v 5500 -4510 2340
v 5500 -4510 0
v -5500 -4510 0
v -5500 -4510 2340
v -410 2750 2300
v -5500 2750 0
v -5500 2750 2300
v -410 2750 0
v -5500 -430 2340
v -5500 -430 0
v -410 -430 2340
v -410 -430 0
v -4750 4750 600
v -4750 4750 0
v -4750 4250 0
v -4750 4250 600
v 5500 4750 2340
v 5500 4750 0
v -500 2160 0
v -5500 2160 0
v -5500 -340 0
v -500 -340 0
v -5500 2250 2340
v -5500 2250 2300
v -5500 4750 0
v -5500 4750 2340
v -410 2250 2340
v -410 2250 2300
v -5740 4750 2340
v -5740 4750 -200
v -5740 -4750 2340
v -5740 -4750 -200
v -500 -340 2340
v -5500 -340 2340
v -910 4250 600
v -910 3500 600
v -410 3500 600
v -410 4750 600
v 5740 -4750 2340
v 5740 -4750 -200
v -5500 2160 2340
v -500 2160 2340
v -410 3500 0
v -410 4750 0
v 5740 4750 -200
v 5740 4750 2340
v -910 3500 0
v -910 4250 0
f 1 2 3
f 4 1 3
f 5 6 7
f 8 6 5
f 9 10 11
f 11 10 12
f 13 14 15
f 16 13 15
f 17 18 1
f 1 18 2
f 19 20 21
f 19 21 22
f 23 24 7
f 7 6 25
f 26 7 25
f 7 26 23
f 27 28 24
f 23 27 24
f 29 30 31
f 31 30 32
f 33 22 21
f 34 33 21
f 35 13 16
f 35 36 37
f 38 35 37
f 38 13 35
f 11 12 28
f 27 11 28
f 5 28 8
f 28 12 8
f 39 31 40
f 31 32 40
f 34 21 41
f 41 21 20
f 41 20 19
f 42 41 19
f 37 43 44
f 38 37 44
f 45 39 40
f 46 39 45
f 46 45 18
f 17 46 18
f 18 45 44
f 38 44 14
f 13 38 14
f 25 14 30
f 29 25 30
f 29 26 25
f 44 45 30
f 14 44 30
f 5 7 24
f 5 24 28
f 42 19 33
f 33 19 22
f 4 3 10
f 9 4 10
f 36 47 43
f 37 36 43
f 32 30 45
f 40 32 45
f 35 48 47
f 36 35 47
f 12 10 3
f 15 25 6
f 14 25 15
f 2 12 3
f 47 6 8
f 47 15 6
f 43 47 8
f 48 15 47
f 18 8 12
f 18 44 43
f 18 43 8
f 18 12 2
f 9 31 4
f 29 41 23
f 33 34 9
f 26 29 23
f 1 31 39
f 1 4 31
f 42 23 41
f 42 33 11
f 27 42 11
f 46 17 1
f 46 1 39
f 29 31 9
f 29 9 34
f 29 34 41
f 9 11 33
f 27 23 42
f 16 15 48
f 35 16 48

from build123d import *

# Parameters (mm, degrees)
F0_W     = 11480
F0_H     = 9500
F1_DEPTH = 200
F3_DEPTH = 2340
F5_DEPTH = 2340
F6_W     = 5090
F6_H     = 500
F7_DEPTH = 2300
F8_DEPTH = 600


with BuildPart() as f1:
    # F0 (on Top) → F1 (new body)
    with BuildSketch(Plane.XY):
        Rectangle(F0_W, F0_H)
    extrude(amount=-F1_DEPTH)

    # F2 (on face) → F3 (join)
    with BuildSketch(Plane.XY):
        Polygon((-5500, 4750), (-5740, 4750), (-5740, -4750), (-5500, -4750), (5740, -4750), (5740, -4510), (5740, 4750), (5500, 4750), (5500, -4510), (-5500, -4510), align=None)
    extrude(amount=F3_DEPTH)

    # F4 (on face) → F5 (join)
    with BuildSketch(Plane.XY):
        Polygon((-5500, -340), (-5500, -430), (-410, -430), (-410, -340), (-410, 2160), (-410, 2250), (-5500, 2250), (-5500, 2160), (-500, 2160), (-500, -340), align=None)
    extrude(amount=F5_DEPTH)

    # F6 (on face) → F7 (join)
    with BuildSketch(Plane.XY):
        with Locations((-2955, 2500)):
            Rectangle(F6_W, F6_H)
    extrude(amount=F7_DEPTH)

    # F6 (on face) → F8 (join)
    with BuildSketch(Plane.XY):
        Polygon((-910, 4750), (-4750, 4750), (-4750, 4250), (-910, 4250), (-910, 3500), (-410, 3500), (-410, 4250), (-410, 4750), align=None)
    extrude(amount=F8_DEPTH)


solid = f1.part
